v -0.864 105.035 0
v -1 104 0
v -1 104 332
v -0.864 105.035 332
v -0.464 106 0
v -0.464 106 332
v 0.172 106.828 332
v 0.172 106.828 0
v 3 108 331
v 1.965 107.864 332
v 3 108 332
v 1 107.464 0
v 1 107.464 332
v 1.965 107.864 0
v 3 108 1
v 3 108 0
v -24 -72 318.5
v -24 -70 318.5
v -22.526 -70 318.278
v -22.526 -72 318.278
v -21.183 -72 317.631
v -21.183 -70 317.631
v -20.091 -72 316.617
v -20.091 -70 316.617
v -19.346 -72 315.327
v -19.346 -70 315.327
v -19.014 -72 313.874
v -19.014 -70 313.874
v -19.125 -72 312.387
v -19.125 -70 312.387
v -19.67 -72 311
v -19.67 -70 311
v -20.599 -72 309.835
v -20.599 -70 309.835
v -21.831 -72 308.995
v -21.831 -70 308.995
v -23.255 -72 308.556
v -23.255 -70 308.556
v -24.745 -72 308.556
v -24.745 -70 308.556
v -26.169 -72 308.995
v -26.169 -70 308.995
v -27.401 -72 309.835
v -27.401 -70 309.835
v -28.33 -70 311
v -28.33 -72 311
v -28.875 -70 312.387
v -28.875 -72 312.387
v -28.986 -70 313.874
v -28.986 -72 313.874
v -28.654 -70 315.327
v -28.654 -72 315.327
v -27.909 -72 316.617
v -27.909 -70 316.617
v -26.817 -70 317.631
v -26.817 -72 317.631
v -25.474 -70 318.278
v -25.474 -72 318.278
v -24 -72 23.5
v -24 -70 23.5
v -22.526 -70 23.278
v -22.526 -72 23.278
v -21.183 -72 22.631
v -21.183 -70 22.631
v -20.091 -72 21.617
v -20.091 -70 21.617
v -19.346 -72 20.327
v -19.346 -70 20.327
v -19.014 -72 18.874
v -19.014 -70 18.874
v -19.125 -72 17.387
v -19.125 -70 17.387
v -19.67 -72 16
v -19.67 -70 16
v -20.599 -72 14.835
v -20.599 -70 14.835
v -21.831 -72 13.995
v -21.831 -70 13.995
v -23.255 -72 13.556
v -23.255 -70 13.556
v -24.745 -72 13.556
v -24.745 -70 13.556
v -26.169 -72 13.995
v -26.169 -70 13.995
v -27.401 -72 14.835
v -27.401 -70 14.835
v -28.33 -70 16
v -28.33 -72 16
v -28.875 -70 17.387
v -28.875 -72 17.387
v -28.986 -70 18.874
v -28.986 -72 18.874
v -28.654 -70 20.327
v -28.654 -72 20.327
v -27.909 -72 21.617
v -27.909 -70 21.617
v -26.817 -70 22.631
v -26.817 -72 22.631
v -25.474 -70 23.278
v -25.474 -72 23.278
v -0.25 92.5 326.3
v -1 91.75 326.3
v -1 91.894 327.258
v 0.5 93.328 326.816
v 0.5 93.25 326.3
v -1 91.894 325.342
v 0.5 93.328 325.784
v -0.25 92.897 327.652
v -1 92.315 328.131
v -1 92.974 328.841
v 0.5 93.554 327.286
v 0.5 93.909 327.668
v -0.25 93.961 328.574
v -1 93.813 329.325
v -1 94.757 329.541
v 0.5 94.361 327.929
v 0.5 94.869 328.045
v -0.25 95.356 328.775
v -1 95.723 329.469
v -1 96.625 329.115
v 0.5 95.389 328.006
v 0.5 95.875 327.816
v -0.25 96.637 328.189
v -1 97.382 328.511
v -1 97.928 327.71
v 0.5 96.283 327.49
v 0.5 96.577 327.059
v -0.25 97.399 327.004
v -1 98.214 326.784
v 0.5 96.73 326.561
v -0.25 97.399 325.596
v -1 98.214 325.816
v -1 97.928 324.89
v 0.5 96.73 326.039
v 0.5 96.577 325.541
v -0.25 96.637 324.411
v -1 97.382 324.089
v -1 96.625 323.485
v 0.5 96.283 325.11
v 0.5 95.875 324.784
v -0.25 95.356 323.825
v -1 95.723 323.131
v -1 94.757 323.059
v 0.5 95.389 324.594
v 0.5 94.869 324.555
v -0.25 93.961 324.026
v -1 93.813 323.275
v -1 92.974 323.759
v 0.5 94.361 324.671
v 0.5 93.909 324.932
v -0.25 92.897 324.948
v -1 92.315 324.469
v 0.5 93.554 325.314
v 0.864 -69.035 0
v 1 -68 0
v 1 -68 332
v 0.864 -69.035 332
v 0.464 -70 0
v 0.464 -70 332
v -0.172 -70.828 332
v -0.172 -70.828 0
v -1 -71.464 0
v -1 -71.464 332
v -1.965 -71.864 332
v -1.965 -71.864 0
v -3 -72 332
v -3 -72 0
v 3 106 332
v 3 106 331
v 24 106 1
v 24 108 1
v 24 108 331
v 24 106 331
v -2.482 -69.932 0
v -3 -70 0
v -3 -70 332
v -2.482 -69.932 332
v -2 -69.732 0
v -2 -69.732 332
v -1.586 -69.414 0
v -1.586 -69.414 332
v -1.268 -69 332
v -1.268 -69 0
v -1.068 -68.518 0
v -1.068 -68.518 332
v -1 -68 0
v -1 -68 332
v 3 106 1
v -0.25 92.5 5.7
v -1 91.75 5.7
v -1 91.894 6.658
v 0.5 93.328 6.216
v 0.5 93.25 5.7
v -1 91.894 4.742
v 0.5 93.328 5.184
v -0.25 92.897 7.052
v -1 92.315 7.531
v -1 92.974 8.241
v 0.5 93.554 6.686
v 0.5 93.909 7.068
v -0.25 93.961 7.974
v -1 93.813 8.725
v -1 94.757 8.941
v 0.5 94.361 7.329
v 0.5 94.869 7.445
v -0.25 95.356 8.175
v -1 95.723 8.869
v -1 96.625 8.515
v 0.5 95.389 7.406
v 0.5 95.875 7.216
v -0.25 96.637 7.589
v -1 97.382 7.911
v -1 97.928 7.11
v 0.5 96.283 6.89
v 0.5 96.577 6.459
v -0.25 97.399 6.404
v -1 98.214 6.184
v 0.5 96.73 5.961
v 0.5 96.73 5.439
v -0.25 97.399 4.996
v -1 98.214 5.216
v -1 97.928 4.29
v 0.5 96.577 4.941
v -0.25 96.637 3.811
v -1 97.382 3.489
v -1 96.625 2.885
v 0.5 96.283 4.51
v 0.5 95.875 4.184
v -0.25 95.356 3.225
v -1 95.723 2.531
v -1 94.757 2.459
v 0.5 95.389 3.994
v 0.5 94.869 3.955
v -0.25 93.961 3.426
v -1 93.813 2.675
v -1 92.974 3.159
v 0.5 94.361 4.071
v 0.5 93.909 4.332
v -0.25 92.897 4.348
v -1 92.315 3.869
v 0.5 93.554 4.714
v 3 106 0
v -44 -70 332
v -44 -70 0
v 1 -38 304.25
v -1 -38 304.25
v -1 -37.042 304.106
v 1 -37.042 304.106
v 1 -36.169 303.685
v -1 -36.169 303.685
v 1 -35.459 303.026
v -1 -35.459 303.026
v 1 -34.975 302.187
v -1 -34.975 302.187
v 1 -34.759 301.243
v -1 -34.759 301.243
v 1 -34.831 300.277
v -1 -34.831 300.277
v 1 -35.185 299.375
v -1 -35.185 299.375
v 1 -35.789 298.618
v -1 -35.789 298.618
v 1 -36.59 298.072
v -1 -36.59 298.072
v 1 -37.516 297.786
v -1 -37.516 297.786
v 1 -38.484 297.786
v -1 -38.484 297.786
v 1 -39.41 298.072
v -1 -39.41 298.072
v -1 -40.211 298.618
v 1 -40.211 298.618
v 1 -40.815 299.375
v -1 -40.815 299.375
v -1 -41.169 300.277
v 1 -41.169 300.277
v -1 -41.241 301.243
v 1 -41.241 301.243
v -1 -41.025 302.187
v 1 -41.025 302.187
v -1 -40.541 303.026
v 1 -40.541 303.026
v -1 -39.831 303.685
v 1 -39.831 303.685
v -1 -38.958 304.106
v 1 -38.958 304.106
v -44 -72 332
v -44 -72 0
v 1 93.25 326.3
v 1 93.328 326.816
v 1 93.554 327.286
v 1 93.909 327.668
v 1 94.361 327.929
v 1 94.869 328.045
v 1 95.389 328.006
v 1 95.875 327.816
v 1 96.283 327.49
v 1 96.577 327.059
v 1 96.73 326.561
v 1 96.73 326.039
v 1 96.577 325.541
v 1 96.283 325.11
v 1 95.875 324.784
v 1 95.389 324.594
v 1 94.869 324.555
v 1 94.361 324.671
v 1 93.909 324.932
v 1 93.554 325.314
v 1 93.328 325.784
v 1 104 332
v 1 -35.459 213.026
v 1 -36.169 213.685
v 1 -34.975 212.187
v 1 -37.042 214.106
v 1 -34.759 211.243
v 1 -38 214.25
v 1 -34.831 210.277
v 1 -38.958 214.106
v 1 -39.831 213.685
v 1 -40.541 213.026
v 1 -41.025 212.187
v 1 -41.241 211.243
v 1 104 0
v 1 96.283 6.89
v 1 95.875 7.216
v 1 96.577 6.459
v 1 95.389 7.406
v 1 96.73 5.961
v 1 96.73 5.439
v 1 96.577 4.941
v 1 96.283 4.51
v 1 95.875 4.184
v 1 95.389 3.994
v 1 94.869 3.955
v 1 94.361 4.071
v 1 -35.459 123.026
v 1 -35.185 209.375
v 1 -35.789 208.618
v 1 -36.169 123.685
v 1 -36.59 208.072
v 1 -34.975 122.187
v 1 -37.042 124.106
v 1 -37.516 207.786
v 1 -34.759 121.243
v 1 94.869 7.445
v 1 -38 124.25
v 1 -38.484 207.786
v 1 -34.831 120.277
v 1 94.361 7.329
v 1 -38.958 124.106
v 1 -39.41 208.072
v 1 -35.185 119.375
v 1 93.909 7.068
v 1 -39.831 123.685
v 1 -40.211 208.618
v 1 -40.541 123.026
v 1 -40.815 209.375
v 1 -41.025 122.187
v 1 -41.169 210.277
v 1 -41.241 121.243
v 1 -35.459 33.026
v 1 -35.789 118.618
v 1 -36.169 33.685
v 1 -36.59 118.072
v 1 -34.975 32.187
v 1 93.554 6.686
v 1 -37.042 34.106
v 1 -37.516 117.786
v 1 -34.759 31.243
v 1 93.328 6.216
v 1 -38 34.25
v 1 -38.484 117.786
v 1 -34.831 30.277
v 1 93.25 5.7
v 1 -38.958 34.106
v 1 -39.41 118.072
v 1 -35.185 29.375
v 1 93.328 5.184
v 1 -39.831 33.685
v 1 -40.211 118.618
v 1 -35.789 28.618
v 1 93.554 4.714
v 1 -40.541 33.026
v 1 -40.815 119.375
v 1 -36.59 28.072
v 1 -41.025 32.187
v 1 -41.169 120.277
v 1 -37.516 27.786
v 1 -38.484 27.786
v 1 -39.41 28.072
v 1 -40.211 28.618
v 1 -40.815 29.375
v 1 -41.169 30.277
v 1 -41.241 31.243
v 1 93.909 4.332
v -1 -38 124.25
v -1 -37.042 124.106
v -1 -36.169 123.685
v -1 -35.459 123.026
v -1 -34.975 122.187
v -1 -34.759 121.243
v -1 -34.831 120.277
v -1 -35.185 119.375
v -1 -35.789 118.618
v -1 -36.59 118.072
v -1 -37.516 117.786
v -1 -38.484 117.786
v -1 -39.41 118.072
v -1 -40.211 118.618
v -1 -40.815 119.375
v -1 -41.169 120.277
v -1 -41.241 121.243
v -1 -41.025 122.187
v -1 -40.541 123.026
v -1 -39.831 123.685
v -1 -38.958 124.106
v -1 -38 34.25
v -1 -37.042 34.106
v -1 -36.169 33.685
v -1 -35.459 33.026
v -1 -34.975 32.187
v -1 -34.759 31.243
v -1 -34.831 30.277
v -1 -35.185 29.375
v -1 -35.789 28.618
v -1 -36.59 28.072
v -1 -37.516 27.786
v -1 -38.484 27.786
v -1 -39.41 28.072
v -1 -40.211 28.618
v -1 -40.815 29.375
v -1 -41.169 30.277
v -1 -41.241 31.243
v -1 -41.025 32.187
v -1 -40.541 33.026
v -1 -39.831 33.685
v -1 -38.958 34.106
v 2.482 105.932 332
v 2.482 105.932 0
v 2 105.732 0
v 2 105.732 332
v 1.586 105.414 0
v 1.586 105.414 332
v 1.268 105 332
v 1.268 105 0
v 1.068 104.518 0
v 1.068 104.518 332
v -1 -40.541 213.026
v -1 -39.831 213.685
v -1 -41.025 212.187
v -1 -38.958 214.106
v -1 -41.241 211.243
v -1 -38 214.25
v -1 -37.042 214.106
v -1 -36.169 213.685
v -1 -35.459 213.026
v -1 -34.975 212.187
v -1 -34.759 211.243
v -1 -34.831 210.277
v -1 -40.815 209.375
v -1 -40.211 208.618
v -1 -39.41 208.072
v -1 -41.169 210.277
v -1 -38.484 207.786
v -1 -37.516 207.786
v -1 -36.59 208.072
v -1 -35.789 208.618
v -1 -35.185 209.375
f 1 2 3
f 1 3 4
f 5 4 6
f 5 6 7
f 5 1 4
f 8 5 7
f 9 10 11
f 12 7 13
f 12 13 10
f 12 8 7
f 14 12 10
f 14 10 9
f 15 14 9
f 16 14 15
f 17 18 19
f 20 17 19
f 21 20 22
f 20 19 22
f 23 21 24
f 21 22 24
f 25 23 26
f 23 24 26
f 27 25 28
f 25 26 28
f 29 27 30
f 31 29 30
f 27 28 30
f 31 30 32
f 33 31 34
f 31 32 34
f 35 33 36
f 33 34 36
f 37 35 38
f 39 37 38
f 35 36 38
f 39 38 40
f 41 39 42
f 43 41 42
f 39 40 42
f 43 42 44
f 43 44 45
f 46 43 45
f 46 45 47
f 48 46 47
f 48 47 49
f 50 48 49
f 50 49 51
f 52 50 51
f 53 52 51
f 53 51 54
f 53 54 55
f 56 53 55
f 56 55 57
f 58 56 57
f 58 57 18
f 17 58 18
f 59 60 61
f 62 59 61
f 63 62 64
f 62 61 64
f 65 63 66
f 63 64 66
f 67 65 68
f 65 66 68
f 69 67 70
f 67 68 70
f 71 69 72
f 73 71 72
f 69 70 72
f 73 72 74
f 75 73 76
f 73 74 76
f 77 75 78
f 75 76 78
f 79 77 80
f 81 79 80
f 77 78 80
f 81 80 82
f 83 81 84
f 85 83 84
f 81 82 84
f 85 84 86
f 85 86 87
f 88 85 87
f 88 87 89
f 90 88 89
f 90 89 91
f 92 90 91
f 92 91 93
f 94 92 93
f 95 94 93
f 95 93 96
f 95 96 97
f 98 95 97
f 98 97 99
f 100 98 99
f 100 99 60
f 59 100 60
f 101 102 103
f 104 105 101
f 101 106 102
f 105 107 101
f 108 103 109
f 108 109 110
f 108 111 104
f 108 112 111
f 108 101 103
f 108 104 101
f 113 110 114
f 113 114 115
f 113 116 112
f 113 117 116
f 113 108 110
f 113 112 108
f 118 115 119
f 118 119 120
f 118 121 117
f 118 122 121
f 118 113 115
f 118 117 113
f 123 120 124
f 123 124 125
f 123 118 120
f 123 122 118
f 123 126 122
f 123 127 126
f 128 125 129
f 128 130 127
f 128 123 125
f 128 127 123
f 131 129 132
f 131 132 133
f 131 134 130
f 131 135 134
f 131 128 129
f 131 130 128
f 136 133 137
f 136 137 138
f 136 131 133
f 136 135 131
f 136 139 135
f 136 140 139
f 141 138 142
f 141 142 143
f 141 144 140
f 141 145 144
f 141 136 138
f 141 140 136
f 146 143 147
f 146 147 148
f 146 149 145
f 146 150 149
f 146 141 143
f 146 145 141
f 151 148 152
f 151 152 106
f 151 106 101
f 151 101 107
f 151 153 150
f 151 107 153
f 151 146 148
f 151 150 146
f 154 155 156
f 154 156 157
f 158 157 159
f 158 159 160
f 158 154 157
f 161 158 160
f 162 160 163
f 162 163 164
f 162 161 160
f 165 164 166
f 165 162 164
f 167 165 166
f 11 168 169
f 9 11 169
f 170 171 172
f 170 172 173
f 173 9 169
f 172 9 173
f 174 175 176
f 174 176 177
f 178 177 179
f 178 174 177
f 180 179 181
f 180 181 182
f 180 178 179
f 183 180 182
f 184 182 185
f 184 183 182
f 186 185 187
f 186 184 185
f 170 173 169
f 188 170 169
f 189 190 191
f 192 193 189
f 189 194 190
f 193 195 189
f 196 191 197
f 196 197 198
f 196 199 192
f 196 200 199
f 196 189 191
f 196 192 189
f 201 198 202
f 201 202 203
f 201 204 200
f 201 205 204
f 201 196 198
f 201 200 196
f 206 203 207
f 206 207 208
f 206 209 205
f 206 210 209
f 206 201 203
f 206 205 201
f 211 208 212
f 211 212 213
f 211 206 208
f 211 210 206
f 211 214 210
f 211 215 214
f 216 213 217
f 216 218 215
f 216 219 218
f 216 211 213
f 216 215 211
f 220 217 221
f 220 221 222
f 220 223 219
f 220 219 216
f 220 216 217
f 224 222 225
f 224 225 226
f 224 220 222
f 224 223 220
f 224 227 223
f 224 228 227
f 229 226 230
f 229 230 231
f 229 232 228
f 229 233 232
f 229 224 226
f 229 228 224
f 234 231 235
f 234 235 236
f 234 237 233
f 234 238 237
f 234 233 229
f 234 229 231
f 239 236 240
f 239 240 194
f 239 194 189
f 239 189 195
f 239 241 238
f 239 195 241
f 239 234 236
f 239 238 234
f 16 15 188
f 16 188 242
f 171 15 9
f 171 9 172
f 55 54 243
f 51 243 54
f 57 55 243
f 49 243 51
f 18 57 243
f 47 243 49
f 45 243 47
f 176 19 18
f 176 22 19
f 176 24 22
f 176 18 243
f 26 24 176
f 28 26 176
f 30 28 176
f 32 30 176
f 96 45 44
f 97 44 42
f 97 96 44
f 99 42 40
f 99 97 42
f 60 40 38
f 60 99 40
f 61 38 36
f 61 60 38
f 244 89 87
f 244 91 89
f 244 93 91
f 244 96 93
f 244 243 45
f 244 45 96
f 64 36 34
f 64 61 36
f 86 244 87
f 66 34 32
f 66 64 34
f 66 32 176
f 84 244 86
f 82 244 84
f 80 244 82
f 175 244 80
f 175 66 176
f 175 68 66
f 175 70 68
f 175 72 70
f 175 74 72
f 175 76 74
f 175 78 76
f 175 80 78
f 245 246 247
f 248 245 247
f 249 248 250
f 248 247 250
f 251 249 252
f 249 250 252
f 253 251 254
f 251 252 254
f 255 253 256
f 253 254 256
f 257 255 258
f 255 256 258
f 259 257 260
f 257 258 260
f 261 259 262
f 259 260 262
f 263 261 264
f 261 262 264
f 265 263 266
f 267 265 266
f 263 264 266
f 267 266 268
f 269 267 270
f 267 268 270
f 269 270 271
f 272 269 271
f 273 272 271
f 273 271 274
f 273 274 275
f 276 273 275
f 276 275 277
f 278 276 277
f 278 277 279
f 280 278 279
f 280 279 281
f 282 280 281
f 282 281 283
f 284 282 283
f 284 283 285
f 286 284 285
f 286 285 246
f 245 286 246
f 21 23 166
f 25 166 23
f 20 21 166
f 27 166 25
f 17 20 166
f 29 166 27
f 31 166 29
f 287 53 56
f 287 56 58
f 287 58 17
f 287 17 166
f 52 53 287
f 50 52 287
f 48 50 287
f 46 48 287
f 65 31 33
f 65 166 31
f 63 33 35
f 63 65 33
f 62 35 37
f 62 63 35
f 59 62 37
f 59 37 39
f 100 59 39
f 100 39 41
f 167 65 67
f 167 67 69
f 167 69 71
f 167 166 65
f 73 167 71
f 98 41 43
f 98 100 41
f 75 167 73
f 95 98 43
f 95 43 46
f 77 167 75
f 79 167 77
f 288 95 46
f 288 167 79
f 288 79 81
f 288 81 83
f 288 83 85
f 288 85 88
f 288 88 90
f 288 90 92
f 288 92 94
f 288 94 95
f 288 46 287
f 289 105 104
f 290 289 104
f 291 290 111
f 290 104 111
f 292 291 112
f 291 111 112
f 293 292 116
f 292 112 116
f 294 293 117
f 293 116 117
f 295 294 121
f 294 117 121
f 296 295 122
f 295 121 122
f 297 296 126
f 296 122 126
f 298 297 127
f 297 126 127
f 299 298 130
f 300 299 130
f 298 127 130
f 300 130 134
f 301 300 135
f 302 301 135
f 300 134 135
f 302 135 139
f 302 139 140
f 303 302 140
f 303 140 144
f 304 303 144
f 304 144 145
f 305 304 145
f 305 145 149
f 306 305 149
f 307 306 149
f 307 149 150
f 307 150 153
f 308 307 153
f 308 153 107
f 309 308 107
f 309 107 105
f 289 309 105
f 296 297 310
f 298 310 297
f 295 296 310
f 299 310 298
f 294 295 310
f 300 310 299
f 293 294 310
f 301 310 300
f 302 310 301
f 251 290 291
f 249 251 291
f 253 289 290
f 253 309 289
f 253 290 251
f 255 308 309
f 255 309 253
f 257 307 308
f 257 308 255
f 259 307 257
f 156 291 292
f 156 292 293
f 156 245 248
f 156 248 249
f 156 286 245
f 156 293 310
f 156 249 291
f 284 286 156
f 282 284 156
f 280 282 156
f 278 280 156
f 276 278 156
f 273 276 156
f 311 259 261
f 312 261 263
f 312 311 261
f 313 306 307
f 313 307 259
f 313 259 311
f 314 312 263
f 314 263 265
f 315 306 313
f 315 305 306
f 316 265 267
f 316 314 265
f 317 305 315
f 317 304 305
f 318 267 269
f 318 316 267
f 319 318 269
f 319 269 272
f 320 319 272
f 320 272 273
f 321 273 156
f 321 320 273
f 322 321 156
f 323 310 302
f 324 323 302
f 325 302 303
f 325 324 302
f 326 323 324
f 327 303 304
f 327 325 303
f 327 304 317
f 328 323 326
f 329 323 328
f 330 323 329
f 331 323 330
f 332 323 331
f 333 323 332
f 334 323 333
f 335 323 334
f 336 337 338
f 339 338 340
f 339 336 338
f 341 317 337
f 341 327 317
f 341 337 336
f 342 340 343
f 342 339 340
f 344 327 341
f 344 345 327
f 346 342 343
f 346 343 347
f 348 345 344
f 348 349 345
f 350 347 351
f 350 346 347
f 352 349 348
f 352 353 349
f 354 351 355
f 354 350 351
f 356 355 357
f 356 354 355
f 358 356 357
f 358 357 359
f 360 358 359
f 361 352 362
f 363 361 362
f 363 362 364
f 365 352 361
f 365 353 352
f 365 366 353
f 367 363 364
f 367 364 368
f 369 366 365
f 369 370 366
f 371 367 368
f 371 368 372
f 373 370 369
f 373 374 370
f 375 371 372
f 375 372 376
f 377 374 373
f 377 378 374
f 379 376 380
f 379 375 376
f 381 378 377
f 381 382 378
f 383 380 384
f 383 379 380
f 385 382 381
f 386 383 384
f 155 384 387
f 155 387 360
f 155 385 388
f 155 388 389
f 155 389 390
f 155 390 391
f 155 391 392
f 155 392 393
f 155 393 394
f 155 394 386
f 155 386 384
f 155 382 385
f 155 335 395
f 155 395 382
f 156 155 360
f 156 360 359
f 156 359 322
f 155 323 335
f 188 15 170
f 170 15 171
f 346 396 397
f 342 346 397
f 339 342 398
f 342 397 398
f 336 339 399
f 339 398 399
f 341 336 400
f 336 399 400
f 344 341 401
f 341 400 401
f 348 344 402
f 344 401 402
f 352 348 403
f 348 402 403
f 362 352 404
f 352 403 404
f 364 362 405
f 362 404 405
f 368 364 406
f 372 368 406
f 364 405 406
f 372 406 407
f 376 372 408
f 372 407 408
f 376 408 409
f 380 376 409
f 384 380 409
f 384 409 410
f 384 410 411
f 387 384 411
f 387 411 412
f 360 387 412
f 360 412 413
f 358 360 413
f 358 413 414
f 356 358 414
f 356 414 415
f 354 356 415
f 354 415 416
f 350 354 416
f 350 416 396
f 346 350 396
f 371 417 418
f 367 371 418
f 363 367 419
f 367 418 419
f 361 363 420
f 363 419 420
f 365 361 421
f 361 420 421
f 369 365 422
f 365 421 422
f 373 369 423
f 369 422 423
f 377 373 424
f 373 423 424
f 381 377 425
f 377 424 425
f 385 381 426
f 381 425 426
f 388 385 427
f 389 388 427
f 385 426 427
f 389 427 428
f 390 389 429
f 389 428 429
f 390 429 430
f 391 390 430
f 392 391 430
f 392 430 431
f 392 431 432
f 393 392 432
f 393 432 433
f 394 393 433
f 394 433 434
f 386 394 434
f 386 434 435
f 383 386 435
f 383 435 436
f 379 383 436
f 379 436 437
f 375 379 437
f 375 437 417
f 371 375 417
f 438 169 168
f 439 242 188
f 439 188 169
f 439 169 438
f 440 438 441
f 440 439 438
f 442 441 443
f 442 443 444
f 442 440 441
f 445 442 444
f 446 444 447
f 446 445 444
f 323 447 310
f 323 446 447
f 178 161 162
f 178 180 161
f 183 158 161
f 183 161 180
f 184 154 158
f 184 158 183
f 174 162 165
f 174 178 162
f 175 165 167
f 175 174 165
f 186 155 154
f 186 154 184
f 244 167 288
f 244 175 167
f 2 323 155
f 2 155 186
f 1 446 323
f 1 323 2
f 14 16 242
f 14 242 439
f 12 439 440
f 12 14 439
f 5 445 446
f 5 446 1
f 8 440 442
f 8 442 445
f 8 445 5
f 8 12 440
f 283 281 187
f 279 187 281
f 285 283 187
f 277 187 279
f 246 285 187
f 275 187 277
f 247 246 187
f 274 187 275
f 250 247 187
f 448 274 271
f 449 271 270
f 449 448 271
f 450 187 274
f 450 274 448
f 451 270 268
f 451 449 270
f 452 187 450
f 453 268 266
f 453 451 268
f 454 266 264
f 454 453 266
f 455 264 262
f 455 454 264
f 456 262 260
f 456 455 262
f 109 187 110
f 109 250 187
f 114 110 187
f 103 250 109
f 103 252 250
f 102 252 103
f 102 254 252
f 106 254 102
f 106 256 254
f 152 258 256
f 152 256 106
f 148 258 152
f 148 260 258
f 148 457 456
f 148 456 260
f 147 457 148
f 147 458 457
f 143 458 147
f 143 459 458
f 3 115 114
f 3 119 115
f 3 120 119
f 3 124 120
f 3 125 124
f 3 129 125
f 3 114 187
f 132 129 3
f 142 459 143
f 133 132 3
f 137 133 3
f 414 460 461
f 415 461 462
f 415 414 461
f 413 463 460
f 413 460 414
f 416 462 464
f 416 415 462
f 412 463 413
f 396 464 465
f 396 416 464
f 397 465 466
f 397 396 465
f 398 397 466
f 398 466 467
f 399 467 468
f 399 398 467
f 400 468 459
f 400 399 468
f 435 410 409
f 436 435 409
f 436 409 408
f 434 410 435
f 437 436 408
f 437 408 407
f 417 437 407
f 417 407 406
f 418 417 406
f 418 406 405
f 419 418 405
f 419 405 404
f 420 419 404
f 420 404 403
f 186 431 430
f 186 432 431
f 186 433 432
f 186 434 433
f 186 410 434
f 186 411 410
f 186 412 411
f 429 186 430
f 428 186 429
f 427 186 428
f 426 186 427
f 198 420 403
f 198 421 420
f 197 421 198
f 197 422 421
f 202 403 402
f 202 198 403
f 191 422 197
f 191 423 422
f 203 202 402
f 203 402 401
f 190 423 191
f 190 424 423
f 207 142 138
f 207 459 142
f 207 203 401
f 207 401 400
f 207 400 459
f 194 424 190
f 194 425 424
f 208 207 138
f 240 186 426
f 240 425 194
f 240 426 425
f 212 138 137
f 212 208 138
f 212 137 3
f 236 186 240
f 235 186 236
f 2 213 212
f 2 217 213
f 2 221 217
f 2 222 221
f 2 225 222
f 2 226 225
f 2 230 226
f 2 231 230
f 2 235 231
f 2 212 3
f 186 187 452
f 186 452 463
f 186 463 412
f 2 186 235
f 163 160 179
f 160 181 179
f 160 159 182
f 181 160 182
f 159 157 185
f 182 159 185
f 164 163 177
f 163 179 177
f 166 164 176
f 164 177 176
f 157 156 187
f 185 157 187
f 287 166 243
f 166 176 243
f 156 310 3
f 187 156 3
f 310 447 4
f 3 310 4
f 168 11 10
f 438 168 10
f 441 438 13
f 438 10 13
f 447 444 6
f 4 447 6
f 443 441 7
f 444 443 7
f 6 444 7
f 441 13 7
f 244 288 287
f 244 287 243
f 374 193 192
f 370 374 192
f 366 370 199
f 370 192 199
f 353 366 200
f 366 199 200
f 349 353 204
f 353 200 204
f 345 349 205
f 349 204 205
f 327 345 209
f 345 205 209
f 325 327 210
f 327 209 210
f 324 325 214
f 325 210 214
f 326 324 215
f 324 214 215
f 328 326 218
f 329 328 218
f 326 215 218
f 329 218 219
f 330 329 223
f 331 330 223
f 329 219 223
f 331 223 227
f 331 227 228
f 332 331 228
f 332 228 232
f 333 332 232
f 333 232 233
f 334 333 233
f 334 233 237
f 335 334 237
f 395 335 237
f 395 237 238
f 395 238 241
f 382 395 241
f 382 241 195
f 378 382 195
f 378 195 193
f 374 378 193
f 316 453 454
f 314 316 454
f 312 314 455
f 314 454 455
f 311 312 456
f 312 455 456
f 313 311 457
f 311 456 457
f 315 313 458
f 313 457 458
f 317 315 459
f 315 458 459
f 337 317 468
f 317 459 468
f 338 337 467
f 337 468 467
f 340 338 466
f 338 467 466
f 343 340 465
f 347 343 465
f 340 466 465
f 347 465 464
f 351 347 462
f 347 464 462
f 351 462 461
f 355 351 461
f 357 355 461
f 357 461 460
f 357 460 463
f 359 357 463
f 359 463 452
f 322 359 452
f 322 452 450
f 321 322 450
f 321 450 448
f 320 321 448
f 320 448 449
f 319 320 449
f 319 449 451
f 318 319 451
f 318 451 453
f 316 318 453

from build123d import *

# Parameters (mm, degrees)
EXTRUDE_1_DEPTH     = 332
SKETCH_2_R          = 3.25
CUT_EXTRUDE_1_DEPTH = 5
SKETCH_3_R          = 5
CUT_EXTRUDE_2_DEPTH = 5
SKETCH_4_W          = 26.179083289
SKETCH_4_H          = 3.25731829
CUT_EXTRUDE_3_DEPTH = 10
SKETCH_5_R          = 1.75
CUT_EXTRUDE_4_DEPTH = 2.5
CHAMFER_1_SIZE      = 1.5


with BuildPart() as part:
    # Эскиз1 → Вытянуть1 (new body)
    with BuildSketch(Plane.XY):
        with BuildLine():
            Line((-1, -68), (-1, 104))
            ThreePointArc((-1, 104), (0.171572875, 106.828427125), (3, 108))
            Line((3, 108), (24, 108))
            Line((24, 108), (24, 106))
            Line((24, 106), (3, 106))
            ThreePointArc((3, 106), (1.585786438, 105.414213562), (1, 104))
            Line((1, 104), (1, -68))
            ThreePointArc((1, -68), (-0.171572875, -70.828427125), (-3, -72))
            Line((-3, -72), (-44, -72))
            Line((-44, -72), (-44, -70))
            Line((-44, -70), (-3, -70))
            ThreePointArc((-3, -70), (-1.585786438, -69.414213562), (-1, -68))
        make_face()
    extrude(amount=EXTRUDE_1_DEPTH)

    # Эскиз2 → Вырез-Вытянуть1 (cut)
    with BuildSketch(Plane.ZY.offset(1)):
        with Locations((31, -38)):
            Circle(SKETCH_2_R)
        with Locations((121, -38)):
            Circle(SKETCH_2_R)
        with Locations((211, -38)):
            Circle(SKETCH_2_R)
        with Locations((301, -38)):
            Circle(SKETCH_2_R)
    extrude(amount=-CUT_EXTRUDE_1_DEPTH, mode=Mode.SUBTRACT)

    # Эскиз3 → Вырез-Вытянуть2 (cut)
    with BuildSketch(Plane(origin=(0, -70, 0), x_dir=(1, 0, 0), z_dir=(0, 1, 0))):
        with Locations(Location((-24, -18.5, 0), (0, 0, 270))):
            Circle(SKETCH_3_R)
        with Locations(Location((-24, -313.5, 0), (0, 0, 270))):
            Circle(SKETCH_3_R)
    extrude(amount=-CUT_EXTRUDE_2_DEPTH, mode=Mode.SUBTRACT)

    # Эскиз4 → Вырез-Вытянуть3 (cut)
    with BuildSketch(Plane(origin=(0, 108, 0), x_dir=(1, 0, 0), z_dir=(0, 1, 0))):
        with Locations((16.089541645, 0.628659145)):
            Rectangle(SKETCH_4_W, SKETCH_4_H)
        with Locations((16.089541645, -332.628659145)):
            Rectangle(SKETCH_4_W, SKETCH_4_H)
    extrude(amount=-CUT_EXTRUDE_3_DEPTH, mode=Mode.SUBTRACT)

    # Эскиз5 → Вырез-Вытянуть4 (cut)
    with BuildSketch(Plane.ZY.offset(1)):
        with Locations(Location((5.7, 95, 0), (0, 0, 270))):
            Circle(SKETCH_5_R)
        with Locations(Location((326.3, 95, 0), (0, 0, 270))):
            Circle(SKETCH_5_R)
    extrude(amount=-CUT_EXTRUDE_4_DEPTH, mode=Mode.SUBTRACT)

    # Фаска1
    chamfer_1_edges = [part.edges().sort_by_distance(p)[0] for p in [
        (-1, 96.75, 326.3),
        (-1, 96.75, 5.7),
    ]]
    chamfer(chamfer_1_edges, length=CHAMFER_1_SIZE)


solid = part.part
